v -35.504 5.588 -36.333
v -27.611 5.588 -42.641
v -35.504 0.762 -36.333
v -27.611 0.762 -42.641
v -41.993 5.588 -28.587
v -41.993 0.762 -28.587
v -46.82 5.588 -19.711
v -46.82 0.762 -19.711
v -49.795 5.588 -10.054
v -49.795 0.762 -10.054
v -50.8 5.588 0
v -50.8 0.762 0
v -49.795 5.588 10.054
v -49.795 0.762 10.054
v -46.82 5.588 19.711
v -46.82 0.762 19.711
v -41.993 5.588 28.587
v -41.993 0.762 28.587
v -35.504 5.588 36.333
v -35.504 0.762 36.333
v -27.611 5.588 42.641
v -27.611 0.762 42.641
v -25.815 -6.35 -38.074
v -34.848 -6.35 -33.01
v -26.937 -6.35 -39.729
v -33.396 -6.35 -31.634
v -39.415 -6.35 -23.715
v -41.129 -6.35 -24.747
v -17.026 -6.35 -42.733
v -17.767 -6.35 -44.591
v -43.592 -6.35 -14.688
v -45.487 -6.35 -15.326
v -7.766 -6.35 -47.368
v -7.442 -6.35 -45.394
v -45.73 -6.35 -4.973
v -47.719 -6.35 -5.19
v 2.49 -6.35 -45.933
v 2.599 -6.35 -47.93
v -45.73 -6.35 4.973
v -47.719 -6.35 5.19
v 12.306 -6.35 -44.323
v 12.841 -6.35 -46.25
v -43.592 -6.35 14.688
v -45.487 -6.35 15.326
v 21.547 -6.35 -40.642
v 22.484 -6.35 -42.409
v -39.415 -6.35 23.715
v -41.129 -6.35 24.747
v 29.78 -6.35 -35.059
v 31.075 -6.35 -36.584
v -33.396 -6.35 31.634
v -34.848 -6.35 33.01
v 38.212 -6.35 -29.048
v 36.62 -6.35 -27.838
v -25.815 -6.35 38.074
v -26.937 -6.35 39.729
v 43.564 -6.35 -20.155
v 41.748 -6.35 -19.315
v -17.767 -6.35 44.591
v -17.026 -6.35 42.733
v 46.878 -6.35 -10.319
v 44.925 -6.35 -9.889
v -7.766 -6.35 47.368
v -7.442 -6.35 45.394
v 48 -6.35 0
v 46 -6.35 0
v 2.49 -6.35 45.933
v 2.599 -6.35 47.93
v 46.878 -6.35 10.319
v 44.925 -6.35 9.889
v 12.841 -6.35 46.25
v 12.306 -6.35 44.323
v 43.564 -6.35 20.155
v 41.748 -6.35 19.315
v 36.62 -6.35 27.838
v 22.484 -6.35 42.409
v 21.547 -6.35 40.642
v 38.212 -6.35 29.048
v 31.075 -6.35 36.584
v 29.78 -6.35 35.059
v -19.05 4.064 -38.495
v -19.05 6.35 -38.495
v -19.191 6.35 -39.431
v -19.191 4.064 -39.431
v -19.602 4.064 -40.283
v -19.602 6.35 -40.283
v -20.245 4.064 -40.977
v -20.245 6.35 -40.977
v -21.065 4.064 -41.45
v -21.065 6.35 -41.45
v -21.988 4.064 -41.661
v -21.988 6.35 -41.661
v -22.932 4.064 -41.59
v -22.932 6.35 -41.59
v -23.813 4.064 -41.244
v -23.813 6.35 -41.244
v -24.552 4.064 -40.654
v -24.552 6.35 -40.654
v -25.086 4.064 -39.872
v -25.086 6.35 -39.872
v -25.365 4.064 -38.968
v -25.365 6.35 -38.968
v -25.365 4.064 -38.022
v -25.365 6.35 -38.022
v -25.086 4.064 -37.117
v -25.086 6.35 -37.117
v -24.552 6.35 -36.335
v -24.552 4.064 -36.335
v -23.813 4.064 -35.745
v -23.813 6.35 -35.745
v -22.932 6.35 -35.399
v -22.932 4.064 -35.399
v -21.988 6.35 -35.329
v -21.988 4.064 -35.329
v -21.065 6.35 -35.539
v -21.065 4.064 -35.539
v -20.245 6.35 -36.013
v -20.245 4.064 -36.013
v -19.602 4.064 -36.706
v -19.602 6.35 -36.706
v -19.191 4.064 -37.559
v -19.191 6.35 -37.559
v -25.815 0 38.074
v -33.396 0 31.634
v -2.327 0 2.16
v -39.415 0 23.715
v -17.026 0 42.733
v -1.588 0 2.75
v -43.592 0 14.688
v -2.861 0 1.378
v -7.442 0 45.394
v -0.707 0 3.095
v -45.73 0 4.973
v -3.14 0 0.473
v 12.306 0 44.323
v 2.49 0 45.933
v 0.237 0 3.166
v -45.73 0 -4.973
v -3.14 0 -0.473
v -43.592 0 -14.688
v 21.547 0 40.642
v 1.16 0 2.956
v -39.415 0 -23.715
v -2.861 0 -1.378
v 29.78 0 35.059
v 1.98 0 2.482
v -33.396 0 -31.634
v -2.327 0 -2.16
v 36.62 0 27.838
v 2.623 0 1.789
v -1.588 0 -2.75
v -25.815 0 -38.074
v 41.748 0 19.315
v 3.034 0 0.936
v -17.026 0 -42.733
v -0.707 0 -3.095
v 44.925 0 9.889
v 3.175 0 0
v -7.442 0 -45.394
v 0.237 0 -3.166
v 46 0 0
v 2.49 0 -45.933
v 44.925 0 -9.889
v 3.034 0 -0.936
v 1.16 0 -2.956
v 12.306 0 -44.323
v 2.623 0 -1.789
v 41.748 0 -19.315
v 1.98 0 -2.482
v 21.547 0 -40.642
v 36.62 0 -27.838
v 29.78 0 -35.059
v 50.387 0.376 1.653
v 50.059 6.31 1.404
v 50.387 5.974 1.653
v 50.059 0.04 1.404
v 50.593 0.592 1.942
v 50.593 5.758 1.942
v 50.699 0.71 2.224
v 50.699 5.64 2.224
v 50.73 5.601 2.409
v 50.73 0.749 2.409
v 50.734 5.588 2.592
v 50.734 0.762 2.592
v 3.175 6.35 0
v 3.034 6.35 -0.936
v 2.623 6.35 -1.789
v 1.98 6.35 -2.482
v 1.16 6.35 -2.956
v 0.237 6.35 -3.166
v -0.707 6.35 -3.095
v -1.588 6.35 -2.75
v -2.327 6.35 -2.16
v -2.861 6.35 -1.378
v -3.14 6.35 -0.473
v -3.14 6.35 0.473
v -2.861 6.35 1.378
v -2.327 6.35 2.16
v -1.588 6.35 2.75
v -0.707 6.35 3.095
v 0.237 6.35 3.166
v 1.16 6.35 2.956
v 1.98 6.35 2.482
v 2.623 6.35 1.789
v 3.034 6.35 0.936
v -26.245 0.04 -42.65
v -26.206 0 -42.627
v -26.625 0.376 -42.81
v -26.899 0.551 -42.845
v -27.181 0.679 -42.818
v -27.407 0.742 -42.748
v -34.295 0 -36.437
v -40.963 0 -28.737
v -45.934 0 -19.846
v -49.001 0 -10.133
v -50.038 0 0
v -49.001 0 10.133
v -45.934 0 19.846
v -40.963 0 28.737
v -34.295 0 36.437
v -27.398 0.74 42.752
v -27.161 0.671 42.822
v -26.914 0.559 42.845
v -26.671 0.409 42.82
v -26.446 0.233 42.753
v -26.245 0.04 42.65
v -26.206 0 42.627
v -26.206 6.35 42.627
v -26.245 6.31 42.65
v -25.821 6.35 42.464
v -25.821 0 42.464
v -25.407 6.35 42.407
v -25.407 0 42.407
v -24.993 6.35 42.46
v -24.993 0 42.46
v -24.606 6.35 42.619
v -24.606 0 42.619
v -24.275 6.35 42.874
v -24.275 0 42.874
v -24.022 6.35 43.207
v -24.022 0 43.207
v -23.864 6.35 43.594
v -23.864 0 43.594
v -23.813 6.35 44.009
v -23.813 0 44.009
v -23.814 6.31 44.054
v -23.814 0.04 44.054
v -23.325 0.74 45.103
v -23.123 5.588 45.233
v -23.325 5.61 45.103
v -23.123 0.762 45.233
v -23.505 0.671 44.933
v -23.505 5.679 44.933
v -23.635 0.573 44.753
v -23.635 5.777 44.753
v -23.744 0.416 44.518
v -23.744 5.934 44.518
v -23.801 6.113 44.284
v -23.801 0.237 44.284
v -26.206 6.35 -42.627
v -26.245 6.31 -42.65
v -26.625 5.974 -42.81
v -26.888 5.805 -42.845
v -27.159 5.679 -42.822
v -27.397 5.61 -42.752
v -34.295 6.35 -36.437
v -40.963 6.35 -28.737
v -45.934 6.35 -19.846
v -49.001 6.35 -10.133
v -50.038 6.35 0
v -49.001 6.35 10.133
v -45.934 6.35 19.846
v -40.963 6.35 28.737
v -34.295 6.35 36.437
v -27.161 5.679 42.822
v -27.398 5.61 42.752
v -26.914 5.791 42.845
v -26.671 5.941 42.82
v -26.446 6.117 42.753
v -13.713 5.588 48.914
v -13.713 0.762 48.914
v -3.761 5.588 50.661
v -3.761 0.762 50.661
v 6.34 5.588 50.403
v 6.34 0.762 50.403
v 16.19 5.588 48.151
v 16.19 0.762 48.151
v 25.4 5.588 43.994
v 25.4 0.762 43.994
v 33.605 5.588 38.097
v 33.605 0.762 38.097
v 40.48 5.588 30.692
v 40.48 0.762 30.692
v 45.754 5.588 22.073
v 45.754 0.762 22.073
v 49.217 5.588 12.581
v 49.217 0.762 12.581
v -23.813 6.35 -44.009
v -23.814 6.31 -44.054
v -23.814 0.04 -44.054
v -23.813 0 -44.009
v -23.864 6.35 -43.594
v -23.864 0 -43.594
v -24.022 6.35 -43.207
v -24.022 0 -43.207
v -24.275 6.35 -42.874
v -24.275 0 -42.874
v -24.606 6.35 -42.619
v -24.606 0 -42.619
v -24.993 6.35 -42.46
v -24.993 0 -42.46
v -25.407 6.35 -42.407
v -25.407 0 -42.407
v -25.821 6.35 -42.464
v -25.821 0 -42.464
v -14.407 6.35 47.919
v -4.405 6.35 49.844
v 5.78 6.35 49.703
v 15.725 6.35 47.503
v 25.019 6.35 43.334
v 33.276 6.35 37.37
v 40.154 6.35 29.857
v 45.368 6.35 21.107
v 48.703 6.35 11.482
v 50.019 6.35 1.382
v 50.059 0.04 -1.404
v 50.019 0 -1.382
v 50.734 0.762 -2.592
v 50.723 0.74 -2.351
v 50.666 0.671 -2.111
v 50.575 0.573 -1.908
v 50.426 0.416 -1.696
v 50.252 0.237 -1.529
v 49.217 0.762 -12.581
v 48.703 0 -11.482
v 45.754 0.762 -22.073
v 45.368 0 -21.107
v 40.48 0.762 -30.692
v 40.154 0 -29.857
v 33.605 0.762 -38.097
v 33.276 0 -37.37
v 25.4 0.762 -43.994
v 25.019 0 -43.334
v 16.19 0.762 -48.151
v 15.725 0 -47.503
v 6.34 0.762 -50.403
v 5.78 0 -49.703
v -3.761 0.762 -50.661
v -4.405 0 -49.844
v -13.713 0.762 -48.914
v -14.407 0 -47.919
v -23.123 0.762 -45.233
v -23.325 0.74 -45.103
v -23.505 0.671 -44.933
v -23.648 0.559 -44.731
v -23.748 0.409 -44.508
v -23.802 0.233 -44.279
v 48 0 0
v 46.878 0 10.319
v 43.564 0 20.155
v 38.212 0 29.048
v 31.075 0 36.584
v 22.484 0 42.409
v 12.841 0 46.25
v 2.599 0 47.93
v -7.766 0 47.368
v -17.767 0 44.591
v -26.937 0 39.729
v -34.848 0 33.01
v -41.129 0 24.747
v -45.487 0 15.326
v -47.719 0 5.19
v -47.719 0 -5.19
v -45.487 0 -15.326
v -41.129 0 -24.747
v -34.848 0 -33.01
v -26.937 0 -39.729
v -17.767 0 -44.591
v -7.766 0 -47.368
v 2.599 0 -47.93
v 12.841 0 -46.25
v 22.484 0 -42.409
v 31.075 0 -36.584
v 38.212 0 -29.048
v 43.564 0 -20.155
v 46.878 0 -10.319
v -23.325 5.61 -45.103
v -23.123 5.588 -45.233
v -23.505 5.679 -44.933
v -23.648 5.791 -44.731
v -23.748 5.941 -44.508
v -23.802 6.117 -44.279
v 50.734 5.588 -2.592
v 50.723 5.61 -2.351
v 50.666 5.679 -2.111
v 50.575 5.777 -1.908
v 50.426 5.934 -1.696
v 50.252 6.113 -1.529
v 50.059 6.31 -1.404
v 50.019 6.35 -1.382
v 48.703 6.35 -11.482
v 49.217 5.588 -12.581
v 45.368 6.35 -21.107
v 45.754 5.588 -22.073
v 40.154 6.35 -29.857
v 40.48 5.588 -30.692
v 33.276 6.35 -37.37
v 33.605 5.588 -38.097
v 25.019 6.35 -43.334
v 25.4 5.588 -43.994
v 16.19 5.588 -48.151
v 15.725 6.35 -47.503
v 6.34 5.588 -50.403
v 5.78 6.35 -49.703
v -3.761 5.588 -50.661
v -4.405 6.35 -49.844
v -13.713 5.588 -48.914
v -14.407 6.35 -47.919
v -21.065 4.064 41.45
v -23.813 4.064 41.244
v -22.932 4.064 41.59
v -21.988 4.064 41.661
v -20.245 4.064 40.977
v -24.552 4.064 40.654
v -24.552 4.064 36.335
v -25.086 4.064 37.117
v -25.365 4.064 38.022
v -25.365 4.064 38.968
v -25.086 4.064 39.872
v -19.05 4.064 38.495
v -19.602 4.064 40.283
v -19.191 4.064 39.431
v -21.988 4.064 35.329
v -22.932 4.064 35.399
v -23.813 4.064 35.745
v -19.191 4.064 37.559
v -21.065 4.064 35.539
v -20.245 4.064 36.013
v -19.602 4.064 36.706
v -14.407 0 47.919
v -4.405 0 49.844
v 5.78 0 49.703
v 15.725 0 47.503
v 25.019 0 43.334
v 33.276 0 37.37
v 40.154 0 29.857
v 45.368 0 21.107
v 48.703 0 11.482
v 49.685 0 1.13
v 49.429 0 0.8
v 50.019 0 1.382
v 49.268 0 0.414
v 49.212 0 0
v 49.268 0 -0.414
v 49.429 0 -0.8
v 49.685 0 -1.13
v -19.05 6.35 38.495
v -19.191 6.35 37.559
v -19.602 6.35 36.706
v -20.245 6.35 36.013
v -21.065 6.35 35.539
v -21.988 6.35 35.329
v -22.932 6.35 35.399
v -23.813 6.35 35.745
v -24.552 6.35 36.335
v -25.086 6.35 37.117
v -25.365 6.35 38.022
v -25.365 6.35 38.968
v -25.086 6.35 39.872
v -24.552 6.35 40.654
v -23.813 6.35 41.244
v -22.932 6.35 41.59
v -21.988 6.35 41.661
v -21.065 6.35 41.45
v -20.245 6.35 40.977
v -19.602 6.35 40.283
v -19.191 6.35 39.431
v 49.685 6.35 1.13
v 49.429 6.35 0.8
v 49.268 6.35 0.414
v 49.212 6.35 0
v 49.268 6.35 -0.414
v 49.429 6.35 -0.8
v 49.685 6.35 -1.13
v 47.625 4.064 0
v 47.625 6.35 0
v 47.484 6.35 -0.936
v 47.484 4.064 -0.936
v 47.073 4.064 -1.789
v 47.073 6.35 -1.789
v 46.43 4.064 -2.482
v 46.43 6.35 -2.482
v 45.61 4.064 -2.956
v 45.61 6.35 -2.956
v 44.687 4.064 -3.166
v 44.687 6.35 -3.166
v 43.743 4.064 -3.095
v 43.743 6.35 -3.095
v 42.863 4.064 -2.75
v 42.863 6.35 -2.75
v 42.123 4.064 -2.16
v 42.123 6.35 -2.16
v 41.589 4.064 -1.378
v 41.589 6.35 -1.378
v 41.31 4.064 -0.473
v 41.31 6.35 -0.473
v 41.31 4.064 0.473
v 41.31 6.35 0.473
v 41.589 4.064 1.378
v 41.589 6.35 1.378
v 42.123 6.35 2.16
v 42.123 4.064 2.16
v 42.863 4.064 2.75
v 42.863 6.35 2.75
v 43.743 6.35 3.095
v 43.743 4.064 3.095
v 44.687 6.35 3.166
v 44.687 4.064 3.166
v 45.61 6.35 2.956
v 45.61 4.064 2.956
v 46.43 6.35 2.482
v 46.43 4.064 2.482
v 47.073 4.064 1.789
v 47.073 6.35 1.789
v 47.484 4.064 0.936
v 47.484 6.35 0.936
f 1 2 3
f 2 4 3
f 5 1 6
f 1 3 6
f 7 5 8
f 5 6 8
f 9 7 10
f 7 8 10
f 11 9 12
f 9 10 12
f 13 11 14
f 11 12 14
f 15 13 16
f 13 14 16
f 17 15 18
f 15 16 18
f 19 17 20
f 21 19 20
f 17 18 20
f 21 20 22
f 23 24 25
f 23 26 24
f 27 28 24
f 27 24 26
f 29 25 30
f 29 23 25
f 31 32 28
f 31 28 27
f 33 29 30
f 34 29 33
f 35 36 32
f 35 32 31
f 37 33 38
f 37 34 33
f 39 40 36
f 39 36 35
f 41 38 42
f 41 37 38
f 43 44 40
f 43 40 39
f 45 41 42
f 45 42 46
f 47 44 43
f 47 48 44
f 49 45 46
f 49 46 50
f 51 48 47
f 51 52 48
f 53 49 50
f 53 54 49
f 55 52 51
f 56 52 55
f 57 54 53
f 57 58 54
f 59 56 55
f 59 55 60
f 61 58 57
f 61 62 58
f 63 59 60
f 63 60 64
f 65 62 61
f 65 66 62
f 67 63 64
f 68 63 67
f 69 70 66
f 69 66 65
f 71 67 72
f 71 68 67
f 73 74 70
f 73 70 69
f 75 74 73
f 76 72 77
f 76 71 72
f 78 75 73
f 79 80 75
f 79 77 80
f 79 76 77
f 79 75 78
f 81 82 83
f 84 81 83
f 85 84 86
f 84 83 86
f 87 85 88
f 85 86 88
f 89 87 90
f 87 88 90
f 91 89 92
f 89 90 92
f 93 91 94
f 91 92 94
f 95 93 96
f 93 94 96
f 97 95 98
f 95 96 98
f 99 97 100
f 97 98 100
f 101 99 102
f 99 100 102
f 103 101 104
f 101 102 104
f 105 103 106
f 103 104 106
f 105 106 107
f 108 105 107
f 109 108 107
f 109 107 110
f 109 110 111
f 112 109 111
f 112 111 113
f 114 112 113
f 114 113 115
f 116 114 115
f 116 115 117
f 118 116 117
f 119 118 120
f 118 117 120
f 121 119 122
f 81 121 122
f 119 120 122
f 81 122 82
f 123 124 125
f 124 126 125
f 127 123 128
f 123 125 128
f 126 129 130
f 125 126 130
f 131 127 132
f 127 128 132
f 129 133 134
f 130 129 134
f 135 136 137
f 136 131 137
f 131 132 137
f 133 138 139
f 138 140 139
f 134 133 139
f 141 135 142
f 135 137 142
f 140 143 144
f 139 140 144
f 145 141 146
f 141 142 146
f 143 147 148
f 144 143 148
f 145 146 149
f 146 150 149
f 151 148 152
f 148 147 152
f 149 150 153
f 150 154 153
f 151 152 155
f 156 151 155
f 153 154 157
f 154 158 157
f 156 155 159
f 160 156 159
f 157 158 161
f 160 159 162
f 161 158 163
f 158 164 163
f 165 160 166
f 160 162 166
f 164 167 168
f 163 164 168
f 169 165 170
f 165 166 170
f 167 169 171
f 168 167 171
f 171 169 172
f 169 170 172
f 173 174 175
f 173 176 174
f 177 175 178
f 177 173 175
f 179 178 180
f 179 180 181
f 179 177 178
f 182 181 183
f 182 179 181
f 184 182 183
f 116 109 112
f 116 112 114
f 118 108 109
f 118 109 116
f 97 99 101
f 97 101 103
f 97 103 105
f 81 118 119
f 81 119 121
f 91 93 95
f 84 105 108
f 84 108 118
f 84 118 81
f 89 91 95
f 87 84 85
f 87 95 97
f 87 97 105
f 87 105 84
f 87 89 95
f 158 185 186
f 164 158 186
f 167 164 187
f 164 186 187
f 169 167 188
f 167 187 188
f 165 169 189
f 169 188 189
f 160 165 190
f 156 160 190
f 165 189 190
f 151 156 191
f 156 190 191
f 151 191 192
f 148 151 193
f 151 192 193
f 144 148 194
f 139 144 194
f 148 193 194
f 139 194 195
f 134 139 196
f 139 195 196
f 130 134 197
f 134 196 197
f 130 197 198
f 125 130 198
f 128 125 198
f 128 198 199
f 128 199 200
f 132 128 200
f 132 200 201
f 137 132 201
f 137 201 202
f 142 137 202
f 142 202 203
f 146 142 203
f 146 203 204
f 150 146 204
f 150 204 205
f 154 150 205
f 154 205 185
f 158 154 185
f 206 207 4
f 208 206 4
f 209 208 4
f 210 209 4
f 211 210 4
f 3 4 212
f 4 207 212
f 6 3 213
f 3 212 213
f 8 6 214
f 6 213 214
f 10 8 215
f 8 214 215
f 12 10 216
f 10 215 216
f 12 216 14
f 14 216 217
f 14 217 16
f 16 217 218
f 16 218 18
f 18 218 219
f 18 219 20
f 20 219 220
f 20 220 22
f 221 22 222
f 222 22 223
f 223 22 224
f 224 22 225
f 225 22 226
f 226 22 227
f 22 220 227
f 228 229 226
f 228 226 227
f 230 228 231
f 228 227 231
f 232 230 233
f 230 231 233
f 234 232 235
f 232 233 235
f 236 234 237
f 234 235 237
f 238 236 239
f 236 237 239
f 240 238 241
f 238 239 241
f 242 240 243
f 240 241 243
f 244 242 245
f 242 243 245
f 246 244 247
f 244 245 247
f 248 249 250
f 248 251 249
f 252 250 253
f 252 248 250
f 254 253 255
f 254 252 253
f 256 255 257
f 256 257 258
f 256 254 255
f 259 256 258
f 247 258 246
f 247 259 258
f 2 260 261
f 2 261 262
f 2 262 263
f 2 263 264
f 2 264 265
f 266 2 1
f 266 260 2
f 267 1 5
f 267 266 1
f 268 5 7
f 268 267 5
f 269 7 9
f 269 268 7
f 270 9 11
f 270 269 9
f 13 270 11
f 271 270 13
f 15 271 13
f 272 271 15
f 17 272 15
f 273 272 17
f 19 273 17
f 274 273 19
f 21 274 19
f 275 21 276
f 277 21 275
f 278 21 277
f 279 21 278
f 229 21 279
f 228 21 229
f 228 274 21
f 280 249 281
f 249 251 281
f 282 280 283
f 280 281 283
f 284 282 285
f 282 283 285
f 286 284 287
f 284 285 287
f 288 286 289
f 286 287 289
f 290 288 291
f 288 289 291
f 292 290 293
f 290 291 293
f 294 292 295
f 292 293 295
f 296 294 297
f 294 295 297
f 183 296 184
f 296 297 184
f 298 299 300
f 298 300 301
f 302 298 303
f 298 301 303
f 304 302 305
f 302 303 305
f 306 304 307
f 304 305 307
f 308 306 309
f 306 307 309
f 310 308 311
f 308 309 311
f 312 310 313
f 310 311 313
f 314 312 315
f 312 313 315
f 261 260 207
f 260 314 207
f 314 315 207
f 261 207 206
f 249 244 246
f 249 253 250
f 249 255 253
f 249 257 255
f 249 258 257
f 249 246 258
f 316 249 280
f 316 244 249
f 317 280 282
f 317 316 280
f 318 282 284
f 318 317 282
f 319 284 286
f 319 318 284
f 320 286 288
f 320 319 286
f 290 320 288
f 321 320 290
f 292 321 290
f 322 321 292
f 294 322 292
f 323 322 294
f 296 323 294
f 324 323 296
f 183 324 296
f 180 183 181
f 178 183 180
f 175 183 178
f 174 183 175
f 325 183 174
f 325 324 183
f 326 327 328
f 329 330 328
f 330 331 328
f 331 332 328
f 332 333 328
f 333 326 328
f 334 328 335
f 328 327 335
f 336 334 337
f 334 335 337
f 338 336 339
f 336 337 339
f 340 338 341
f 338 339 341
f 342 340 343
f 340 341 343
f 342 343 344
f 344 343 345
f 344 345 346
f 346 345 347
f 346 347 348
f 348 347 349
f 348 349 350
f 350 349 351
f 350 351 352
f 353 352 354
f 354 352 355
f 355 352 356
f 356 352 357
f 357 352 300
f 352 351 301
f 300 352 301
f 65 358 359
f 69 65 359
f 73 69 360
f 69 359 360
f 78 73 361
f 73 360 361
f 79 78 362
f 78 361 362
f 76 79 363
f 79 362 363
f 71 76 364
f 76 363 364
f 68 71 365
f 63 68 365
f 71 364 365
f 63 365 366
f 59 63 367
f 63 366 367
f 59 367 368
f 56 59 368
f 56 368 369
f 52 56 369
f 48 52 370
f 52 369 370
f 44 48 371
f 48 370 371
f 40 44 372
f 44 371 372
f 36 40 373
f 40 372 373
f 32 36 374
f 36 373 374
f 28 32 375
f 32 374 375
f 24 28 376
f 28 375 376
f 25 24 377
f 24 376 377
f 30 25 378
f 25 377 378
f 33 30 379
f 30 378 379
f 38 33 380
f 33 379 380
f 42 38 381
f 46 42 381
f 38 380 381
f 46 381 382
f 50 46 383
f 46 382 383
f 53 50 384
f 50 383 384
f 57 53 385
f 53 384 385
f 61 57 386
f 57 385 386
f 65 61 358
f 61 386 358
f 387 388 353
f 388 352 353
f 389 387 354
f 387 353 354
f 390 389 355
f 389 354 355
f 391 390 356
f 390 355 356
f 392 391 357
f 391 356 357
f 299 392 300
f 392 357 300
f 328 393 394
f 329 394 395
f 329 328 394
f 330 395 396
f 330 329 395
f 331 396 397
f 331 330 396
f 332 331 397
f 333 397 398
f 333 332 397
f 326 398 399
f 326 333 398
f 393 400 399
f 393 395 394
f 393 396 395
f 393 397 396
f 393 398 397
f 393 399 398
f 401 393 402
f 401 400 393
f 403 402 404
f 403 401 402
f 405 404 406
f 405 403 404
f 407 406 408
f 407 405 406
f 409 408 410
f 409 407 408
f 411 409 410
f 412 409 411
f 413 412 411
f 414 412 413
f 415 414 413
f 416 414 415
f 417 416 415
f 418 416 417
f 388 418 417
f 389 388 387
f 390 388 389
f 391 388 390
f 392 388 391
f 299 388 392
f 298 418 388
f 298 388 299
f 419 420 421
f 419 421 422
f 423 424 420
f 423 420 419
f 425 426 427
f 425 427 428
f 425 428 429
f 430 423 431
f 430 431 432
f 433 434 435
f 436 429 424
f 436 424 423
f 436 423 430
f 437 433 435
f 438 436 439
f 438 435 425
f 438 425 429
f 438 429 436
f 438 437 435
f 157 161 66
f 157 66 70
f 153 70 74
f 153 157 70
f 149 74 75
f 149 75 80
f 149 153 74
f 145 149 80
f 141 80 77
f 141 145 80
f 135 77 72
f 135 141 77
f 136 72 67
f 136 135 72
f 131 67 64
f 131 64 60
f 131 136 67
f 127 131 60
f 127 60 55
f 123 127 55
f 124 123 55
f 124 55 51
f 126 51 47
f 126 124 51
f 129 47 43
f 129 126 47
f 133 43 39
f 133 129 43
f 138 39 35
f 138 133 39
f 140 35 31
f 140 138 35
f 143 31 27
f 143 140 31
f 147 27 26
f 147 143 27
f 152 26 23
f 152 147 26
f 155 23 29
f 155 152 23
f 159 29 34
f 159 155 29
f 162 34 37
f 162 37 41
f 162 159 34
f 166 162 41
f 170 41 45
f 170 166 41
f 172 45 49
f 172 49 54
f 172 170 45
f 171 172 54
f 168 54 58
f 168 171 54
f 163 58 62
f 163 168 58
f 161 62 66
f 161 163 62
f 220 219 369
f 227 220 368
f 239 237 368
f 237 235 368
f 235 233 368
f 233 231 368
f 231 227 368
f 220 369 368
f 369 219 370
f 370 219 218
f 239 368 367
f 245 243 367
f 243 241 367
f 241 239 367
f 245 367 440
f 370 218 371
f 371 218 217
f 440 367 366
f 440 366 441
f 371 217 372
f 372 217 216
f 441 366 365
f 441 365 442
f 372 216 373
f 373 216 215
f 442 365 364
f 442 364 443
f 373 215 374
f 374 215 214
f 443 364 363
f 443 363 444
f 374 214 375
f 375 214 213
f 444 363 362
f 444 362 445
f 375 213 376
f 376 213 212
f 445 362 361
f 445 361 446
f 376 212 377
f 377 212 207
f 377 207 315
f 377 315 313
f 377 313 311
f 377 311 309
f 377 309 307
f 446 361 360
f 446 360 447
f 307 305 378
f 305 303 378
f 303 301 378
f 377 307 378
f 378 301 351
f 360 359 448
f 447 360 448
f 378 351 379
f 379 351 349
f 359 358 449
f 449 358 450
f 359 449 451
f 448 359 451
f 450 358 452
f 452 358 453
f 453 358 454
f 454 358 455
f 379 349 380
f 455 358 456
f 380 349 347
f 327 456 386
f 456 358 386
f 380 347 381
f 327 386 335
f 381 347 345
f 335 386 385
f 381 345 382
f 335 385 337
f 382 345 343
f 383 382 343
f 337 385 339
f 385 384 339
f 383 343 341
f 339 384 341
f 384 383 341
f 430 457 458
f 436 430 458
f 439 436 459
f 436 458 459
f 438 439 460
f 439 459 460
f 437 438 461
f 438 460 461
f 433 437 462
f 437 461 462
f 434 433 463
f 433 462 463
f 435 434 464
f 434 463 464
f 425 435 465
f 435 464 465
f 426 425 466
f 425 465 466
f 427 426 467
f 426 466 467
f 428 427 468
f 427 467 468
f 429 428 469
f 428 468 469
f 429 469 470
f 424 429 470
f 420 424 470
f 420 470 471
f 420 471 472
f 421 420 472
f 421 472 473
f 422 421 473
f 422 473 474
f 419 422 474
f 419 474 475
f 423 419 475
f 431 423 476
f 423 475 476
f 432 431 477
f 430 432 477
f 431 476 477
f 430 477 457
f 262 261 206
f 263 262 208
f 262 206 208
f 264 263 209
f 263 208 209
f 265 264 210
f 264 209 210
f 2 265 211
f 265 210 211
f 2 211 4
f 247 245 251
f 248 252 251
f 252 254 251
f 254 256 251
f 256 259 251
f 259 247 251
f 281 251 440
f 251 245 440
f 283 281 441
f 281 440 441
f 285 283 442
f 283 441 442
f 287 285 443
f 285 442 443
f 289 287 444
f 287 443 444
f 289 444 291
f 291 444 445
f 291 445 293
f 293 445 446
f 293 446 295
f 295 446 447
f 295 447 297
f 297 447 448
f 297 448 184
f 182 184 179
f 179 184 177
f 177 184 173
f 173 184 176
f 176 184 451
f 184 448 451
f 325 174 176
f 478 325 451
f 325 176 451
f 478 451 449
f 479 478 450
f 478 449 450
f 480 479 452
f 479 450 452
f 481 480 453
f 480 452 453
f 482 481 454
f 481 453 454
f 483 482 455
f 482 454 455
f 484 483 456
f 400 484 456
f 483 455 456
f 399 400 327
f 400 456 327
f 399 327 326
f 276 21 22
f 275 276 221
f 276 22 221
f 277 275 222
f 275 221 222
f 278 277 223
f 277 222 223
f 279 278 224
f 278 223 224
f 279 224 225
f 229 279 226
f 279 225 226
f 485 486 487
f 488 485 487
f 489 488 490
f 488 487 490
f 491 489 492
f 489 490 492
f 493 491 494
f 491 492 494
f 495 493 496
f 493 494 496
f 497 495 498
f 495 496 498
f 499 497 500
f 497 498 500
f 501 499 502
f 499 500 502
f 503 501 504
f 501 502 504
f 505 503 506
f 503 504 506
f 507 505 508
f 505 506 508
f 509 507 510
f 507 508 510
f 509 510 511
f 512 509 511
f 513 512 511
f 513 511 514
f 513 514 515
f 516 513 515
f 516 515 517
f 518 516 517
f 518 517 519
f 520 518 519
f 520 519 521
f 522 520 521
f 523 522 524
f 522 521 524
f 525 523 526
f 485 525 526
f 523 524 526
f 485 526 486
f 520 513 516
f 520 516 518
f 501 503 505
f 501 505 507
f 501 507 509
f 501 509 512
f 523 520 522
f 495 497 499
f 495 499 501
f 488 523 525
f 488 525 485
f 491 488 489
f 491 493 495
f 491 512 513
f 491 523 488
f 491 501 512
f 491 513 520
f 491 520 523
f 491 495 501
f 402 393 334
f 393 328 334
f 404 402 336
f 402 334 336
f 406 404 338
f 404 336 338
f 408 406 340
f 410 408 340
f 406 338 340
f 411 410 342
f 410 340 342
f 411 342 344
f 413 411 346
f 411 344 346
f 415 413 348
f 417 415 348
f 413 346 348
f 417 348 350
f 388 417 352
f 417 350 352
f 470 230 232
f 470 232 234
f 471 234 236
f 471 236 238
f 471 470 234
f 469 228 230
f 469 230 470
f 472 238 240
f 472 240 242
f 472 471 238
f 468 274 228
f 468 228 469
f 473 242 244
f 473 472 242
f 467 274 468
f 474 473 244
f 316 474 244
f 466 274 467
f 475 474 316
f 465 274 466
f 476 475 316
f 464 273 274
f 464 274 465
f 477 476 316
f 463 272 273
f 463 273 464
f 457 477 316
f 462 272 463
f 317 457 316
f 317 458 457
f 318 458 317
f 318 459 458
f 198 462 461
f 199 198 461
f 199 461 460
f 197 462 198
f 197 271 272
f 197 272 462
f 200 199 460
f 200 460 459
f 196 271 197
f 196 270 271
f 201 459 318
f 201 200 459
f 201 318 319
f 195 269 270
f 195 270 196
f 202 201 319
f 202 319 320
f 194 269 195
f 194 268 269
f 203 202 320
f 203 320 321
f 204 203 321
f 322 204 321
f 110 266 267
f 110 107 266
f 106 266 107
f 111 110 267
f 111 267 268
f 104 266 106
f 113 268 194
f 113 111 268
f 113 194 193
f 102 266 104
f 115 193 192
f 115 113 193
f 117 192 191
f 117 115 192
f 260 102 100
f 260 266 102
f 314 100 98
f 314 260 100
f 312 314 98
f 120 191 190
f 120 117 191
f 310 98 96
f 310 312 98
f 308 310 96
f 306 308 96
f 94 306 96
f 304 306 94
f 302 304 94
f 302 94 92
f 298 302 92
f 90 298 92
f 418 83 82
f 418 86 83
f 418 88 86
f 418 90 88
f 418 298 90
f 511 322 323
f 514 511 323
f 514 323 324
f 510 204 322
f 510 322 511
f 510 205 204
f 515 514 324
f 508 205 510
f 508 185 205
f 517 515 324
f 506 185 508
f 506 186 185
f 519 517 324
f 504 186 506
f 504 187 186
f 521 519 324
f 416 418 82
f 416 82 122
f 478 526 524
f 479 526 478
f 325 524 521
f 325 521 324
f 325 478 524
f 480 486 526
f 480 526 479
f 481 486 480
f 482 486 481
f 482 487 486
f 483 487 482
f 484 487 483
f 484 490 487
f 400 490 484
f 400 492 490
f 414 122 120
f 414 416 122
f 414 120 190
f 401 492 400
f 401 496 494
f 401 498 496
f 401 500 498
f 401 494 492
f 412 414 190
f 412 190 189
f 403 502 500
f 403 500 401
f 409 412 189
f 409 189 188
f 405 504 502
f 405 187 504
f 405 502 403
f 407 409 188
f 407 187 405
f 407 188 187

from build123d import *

# Parameters (mm, degrees)
SKETCH1_R               = 50.8
BOSS_EXTRUDE1_DEPTH     = 6.35
SKETCH2_R               = 3.175
CUT_EXTRUDE1_DEPTH      = 2.286
SKETCH3_R               = 3.175
CUT_EXTRUDE2_DEPTH      = 1
CUT_EXTRUDE2_DEPTH_BACK = 7.35
SKETCH4_R               = 1.5875
CUT_EXTRUDE3_DEPTH      = 7.35
CHAMFER1_SIZE           = 0.762
FILLET1_R               = 1.27
SKETCH5_R               = 48
SKETCH5_R_2             = 46
BOSS_EXTRUDE2_DEPTH     = 6.35


with BuildPart() as part:
    # Sketch1 → Boss-Extrude1 (new body)
    with BuildSketch(Plane(origin=(0, 0, 0), x_dir=(1, 0, 0), z_dir=(0, 1, 0))):
        Circle(SKETCH1_R)
    extrude(amount=BOSS_EXTRUDE1_DEPTH)

    # Sketch2 → Cut-Extrude1 (cut)
    with BuildSketch(Plane(origin=(0, 6.35, 0), x_dir=(1, 0, 0), z_dir=(0, 1, 0))):
        with Locations((-22.225, -38.494829198)):
            Circle(SKETCH2_R)
        with Locations((-22.225, 38.494829198)):
            Circle(SKETCH2_R)
        with Locations((44.45, 0)):
            Circle(SKETCH2_R)
    extrude(amount=-CUT_EXTRUDE1_DEPTH, mode=Mode.SUBTRACT)

    # Sketch3 → Cut-Extrude2 (cut, two sides)
    with BuildSketch(Plane(origin=(0, 6.35, 0), x_dir=(1, 0, 0), z_dir=(0, 1, 0))) as cut_extrude2_sk:
        Circle(SKETCH3_R)
    extrude(amount=CUT_EXTRUDE2_DEPTH, mode=Mode.SUBTRACT)
    extrude(cut_extrude2_sk.sketch, amount=-CUT_EXTRUDE2_DEPTH_BACK, mode=Mode.SUBTRACT)

    # Sketch4 → Cut-Extrude3 (cut, through all)
    with BuildSketch(Plane.XZ):
        with Locations((50.8, 0)):
            Circle(SKETCH4_R)
        with Locations((-25.4, 43.994090512)):
            Circle(SKETCH4_R)
        with Locations((-25.4, -43.994090512)):
            Circle(SKETCH4_R)
    extrude(amount=-CUT_EXTRUDE3_DEPTH, mode=Mode.SUBTRACT)

    # Chamfer1
    chamfer1_edges = [part.edges().sort_by_distance(p)[0] for p in [
        (25.4, 0, -43.994090512),
        (-50.8, 0, 0),
        (25.4, 0, 43.994090512),
        (25.4, 6.35, -43.994090512),
        (-50.8, 6.35, 0),
        (25.4, 6.35, 43.994090512),
    ]]
    chamfer(chamfer1_edges, length=CHAMFER1_SIZE)

    # Fillet1
    fillet1_edges = [part.edges().sort_by_distance(p)[0] for p in [
        (-24.012950162, 3.175, 44.766262124),
        (-26.76224515, 3.175, 43.178955922),
        (50.775195313, 3.175, -1.587306202),
        (50.775195313, 3.175, 1.587306202),
        (-24.012950162, 3.175, -44.766262124),
        (-26.76224515, 3.175, -43.178955922),
    ]]
    fillet(fillet1_edges, radius=FILLET1_R)

    # Sketch5 → Boss-Extrude2 (add)
    with BuildSketch(Plane.XZ):
        Circle(SKETCH5_R)
        Circle(SKETCH5_R_2, mode=Mode.SUBTRACT)
    extrude(amount=BOSS_EXTRUDE2_DEPTH)


solid = part.part
